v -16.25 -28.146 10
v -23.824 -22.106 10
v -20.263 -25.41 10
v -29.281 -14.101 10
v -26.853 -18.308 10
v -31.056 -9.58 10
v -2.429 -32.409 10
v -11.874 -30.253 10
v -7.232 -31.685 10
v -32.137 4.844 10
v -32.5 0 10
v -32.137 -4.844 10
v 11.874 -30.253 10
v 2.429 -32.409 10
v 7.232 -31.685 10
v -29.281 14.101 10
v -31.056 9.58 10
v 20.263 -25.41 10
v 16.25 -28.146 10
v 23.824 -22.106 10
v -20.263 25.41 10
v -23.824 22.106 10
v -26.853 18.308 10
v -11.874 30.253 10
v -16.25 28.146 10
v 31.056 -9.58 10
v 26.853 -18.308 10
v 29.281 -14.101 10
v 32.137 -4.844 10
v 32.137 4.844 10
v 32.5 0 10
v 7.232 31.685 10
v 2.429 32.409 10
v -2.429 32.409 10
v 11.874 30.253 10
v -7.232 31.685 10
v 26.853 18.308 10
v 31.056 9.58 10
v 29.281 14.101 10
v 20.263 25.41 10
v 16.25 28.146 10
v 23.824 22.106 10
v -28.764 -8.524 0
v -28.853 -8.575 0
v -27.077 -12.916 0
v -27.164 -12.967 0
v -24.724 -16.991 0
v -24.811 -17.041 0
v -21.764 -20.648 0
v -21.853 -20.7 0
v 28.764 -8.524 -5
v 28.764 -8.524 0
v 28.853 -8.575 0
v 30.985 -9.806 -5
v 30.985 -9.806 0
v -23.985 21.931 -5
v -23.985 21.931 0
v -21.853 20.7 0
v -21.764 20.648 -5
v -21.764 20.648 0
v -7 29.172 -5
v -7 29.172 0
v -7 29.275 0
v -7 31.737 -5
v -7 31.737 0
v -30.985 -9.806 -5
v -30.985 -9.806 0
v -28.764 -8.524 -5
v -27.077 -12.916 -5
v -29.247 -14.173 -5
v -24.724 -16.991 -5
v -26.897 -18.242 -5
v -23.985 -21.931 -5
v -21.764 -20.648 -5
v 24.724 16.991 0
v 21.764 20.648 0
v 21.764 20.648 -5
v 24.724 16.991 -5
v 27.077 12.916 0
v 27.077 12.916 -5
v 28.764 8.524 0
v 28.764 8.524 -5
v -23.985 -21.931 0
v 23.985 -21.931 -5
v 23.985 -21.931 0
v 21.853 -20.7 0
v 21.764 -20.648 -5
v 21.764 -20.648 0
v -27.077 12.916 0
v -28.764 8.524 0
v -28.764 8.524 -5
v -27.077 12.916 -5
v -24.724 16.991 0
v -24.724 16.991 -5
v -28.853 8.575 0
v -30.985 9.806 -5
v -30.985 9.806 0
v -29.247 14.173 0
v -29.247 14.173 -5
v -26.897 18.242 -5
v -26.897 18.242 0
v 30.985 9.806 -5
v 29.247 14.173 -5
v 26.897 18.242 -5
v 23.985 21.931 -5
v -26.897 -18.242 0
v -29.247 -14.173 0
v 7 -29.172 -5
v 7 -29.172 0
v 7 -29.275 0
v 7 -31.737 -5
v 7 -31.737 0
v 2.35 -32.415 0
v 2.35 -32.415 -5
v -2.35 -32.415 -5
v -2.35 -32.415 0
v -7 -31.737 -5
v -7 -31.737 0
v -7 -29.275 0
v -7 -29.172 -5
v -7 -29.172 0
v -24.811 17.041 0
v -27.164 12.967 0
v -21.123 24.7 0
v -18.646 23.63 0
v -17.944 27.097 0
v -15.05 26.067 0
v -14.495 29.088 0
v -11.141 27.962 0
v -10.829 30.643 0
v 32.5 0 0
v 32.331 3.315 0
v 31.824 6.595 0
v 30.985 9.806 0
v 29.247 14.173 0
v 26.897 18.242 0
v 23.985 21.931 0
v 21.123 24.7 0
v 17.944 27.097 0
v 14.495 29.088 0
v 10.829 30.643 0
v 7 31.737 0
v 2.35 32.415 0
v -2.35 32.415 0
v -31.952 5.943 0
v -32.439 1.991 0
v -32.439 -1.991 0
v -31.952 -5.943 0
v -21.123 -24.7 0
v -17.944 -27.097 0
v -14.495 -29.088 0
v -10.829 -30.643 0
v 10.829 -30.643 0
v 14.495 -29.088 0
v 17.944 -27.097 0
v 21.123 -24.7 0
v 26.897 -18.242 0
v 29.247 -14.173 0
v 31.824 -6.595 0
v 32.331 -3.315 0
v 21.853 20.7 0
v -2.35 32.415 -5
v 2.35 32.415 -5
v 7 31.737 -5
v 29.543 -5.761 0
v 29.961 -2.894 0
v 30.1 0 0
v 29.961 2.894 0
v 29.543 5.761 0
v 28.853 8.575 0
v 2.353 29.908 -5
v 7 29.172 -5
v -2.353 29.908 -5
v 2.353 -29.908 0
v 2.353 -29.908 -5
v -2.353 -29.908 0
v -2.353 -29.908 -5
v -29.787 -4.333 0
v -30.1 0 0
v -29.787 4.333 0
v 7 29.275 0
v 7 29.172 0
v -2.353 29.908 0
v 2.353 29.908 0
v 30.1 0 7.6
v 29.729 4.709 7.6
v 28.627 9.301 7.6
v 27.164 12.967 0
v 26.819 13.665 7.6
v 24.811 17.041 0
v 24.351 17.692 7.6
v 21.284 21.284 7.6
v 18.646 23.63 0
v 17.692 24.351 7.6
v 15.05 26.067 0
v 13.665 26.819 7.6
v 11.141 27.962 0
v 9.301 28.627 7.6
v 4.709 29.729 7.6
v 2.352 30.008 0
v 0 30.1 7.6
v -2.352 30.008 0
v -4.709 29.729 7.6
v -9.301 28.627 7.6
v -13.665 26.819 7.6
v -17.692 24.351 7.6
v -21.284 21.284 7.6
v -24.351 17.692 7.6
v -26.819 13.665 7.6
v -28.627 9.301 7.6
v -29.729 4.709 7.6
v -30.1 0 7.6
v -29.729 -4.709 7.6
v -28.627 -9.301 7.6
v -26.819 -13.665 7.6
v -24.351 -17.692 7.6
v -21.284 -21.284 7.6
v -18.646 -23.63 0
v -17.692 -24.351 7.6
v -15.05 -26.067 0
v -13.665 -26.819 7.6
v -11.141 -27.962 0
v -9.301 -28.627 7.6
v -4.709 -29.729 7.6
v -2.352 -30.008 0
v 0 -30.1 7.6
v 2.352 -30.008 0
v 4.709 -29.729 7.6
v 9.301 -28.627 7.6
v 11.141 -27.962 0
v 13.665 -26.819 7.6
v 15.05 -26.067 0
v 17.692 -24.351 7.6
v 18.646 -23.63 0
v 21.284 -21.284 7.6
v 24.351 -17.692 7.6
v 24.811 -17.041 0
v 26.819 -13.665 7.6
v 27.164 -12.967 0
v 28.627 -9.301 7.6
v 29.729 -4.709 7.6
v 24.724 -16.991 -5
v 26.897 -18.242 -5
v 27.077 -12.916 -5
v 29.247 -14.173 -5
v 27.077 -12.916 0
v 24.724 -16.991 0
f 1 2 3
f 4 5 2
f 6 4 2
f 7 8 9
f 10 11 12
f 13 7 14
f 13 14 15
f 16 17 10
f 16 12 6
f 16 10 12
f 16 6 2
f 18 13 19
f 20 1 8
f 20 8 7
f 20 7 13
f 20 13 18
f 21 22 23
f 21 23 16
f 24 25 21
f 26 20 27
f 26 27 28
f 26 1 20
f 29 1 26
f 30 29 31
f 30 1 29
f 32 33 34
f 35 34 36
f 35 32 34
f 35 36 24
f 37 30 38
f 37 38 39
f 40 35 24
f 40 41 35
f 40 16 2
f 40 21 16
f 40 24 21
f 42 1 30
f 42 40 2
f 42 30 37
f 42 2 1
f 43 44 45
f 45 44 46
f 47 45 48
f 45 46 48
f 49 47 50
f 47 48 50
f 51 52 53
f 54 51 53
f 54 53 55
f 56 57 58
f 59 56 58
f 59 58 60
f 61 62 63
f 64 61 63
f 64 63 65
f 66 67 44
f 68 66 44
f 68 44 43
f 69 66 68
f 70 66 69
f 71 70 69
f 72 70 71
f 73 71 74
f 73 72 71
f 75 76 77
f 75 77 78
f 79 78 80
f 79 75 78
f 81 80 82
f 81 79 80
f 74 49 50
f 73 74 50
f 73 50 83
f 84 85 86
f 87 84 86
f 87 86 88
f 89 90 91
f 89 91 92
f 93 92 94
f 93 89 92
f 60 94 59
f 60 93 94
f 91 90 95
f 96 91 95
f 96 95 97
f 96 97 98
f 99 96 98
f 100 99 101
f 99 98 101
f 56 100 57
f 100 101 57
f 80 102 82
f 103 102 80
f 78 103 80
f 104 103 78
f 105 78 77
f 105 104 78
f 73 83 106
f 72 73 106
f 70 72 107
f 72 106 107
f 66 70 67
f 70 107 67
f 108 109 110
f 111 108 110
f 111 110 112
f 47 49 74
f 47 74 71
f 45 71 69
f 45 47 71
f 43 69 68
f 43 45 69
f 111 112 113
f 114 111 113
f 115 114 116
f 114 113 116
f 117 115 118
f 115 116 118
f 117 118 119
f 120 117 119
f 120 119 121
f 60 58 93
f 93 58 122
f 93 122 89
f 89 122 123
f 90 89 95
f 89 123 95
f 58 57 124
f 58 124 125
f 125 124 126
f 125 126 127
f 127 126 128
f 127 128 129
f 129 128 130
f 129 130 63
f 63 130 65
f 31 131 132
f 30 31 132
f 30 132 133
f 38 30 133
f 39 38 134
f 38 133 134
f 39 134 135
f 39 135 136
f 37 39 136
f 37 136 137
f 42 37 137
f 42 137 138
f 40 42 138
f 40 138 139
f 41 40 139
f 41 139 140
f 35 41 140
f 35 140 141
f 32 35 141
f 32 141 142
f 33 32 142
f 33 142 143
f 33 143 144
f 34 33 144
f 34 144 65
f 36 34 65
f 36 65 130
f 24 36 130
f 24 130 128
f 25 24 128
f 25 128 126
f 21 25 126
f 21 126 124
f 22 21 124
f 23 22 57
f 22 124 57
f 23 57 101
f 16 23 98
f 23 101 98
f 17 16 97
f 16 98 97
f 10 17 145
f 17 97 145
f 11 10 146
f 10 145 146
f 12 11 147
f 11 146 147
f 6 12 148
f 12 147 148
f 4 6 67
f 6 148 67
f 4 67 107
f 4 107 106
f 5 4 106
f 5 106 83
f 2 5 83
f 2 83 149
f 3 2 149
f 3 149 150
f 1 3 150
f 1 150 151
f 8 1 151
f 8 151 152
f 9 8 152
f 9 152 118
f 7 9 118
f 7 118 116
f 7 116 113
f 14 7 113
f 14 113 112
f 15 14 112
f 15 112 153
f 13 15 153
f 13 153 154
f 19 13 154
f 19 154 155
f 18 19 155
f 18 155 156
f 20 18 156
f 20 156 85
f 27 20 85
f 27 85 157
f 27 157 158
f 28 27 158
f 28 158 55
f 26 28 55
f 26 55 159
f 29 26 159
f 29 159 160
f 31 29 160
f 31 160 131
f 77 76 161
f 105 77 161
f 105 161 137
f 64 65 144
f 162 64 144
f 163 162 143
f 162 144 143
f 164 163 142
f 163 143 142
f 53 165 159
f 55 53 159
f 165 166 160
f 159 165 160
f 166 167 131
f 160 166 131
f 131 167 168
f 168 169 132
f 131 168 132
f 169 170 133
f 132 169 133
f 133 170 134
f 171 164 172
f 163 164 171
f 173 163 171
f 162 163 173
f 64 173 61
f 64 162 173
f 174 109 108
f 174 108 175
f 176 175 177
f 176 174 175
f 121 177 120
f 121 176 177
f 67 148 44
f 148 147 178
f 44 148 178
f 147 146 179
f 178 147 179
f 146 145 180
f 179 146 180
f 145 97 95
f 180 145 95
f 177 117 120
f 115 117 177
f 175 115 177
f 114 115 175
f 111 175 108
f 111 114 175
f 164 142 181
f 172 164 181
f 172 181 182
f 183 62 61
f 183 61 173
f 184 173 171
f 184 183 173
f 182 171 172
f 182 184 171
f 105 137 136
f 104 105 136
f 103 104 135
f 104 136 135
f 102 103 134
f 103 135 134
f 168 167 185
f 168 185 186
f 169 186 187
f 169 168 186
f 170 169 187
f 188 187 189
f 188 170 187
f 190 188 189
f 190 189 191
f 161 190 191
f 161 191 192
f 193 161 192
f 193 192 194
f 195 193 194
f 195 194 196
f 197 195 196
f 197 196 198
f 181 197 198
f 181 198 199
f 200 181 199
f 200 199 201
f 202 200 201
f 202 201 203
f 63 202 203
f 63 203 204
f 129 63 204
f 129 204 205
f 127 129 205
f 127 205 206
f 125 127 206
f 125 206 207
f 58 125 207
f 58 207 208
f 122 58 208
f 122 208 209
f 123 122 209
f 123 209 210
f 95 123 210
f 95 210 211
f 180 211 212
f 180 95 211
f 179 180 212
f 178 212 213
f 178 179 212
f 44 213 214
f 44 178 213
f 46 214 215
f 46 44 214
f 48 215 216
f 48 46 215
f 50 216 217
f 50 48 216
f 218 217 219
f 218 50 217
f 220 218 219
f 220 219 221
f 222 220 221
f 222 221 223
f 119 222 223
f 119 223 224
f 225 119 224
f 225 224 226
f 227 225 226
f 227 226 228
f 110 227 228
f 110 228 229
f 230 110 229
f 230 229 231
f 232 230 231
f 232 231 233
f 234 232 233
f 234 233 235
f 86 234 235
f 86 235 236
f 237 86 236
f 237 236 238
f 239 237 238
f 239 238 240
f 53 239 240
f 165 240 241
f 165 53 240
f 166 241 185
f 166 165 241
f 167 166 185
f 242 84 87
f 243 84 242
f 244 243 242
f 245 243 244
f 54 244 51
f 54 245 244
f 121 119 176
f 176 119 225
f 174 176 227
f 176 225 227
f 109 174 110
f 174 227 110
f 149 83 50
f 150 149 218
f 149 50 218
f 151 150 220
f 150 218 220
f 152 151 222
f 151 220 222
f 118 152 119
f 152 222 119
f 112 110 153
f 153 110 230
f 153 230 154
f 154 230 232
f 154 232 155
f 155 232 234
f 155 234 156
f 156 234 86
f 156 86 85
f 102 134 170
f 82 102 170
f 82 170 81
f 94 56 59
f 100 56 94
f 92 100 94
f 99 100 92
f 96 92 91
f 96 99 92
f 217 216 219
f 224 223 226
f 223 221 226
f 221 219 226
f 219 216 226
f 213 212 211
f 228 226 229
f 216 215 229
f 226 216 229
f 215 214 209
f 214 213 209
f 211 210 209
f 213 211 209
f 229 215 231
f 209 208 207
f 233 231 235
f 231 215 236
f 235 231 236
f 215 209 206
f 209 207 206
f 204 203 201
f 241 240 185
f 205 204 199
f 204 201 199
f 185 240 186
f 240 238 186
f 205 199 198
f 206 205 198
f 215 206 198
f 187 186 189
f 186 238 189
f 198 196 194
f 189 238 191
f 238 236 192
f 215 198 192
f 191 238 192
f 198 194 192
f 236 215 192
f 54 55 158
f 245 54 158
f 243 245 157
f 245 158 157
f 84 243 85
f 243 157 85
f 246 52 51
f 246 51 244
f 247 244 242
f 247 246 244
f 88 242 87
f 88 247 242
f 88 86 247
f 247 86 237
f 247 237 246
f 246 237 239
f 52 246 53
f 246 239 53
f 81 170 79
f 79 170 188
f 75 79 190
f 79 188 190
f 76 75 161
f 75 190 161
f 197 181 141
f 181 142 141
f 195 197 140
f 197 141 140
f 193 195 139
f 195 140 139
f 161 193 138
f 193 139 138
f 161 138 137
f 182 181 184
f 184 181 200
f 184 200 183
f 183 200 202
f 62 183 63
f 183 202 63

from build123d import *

# Parameters (mm, degrees)
SKETCH044_R           = 32.5
PAD022_DEPTH          = 10
THICKNESS002_T        = -2.4
PAD023_DEPTH          = 5
POLARPATTERN012_COUNT = 6


with BuildPart() as part:
    # Sketch044 → Pad022 (new body)
    with BuildSketch(Plane.XY):
        Circle(SKETCH044_R)
    extrude(amount=PAD022_DEPTH)

    # Thickness002
    thickness002_openings = [part.faces().sort_by_distance(p)[0] for p in [
        (0, 0, 0),
    ]]
    offset(amount=THICKNESS002_T, openings=thickness002_openings)

    # Sketch045 (on Face2 of Pad022) → Pad023 (join)
    with BuildSketch(Plane(origin=(0, 0, 0), x_dir=(1, 0, 0), z_dir=(0, 0, -1))):
        with BuildLine():
            Line((-7, 31.7372021451), (-7, 29.1719042916))
            ThreePointArc((7, 29.1719042916), (0, 30), (-7, 29.1719042916))
            Line((7, 29.1719042916), (7, 31.7372021451))
            ThreePointArc((7, 31.7372021451), (0, 32.5), (-7, 31.7372021451))
        make_face()
    pad023 = extrude(amount=PAD023_DEPTH)

    # PolarPattern012: Pad023 ×6 about axis
    polarpattern012_axis = Axis((0, 0, 0), (0, 0, -1))
    for i in range(1, POLARPATTERN012_COUNT):
        add(pad023.rotate(polarpattern012_axis, i * 360 / POLARPATTERN012_COUNT))


solid = part.part
